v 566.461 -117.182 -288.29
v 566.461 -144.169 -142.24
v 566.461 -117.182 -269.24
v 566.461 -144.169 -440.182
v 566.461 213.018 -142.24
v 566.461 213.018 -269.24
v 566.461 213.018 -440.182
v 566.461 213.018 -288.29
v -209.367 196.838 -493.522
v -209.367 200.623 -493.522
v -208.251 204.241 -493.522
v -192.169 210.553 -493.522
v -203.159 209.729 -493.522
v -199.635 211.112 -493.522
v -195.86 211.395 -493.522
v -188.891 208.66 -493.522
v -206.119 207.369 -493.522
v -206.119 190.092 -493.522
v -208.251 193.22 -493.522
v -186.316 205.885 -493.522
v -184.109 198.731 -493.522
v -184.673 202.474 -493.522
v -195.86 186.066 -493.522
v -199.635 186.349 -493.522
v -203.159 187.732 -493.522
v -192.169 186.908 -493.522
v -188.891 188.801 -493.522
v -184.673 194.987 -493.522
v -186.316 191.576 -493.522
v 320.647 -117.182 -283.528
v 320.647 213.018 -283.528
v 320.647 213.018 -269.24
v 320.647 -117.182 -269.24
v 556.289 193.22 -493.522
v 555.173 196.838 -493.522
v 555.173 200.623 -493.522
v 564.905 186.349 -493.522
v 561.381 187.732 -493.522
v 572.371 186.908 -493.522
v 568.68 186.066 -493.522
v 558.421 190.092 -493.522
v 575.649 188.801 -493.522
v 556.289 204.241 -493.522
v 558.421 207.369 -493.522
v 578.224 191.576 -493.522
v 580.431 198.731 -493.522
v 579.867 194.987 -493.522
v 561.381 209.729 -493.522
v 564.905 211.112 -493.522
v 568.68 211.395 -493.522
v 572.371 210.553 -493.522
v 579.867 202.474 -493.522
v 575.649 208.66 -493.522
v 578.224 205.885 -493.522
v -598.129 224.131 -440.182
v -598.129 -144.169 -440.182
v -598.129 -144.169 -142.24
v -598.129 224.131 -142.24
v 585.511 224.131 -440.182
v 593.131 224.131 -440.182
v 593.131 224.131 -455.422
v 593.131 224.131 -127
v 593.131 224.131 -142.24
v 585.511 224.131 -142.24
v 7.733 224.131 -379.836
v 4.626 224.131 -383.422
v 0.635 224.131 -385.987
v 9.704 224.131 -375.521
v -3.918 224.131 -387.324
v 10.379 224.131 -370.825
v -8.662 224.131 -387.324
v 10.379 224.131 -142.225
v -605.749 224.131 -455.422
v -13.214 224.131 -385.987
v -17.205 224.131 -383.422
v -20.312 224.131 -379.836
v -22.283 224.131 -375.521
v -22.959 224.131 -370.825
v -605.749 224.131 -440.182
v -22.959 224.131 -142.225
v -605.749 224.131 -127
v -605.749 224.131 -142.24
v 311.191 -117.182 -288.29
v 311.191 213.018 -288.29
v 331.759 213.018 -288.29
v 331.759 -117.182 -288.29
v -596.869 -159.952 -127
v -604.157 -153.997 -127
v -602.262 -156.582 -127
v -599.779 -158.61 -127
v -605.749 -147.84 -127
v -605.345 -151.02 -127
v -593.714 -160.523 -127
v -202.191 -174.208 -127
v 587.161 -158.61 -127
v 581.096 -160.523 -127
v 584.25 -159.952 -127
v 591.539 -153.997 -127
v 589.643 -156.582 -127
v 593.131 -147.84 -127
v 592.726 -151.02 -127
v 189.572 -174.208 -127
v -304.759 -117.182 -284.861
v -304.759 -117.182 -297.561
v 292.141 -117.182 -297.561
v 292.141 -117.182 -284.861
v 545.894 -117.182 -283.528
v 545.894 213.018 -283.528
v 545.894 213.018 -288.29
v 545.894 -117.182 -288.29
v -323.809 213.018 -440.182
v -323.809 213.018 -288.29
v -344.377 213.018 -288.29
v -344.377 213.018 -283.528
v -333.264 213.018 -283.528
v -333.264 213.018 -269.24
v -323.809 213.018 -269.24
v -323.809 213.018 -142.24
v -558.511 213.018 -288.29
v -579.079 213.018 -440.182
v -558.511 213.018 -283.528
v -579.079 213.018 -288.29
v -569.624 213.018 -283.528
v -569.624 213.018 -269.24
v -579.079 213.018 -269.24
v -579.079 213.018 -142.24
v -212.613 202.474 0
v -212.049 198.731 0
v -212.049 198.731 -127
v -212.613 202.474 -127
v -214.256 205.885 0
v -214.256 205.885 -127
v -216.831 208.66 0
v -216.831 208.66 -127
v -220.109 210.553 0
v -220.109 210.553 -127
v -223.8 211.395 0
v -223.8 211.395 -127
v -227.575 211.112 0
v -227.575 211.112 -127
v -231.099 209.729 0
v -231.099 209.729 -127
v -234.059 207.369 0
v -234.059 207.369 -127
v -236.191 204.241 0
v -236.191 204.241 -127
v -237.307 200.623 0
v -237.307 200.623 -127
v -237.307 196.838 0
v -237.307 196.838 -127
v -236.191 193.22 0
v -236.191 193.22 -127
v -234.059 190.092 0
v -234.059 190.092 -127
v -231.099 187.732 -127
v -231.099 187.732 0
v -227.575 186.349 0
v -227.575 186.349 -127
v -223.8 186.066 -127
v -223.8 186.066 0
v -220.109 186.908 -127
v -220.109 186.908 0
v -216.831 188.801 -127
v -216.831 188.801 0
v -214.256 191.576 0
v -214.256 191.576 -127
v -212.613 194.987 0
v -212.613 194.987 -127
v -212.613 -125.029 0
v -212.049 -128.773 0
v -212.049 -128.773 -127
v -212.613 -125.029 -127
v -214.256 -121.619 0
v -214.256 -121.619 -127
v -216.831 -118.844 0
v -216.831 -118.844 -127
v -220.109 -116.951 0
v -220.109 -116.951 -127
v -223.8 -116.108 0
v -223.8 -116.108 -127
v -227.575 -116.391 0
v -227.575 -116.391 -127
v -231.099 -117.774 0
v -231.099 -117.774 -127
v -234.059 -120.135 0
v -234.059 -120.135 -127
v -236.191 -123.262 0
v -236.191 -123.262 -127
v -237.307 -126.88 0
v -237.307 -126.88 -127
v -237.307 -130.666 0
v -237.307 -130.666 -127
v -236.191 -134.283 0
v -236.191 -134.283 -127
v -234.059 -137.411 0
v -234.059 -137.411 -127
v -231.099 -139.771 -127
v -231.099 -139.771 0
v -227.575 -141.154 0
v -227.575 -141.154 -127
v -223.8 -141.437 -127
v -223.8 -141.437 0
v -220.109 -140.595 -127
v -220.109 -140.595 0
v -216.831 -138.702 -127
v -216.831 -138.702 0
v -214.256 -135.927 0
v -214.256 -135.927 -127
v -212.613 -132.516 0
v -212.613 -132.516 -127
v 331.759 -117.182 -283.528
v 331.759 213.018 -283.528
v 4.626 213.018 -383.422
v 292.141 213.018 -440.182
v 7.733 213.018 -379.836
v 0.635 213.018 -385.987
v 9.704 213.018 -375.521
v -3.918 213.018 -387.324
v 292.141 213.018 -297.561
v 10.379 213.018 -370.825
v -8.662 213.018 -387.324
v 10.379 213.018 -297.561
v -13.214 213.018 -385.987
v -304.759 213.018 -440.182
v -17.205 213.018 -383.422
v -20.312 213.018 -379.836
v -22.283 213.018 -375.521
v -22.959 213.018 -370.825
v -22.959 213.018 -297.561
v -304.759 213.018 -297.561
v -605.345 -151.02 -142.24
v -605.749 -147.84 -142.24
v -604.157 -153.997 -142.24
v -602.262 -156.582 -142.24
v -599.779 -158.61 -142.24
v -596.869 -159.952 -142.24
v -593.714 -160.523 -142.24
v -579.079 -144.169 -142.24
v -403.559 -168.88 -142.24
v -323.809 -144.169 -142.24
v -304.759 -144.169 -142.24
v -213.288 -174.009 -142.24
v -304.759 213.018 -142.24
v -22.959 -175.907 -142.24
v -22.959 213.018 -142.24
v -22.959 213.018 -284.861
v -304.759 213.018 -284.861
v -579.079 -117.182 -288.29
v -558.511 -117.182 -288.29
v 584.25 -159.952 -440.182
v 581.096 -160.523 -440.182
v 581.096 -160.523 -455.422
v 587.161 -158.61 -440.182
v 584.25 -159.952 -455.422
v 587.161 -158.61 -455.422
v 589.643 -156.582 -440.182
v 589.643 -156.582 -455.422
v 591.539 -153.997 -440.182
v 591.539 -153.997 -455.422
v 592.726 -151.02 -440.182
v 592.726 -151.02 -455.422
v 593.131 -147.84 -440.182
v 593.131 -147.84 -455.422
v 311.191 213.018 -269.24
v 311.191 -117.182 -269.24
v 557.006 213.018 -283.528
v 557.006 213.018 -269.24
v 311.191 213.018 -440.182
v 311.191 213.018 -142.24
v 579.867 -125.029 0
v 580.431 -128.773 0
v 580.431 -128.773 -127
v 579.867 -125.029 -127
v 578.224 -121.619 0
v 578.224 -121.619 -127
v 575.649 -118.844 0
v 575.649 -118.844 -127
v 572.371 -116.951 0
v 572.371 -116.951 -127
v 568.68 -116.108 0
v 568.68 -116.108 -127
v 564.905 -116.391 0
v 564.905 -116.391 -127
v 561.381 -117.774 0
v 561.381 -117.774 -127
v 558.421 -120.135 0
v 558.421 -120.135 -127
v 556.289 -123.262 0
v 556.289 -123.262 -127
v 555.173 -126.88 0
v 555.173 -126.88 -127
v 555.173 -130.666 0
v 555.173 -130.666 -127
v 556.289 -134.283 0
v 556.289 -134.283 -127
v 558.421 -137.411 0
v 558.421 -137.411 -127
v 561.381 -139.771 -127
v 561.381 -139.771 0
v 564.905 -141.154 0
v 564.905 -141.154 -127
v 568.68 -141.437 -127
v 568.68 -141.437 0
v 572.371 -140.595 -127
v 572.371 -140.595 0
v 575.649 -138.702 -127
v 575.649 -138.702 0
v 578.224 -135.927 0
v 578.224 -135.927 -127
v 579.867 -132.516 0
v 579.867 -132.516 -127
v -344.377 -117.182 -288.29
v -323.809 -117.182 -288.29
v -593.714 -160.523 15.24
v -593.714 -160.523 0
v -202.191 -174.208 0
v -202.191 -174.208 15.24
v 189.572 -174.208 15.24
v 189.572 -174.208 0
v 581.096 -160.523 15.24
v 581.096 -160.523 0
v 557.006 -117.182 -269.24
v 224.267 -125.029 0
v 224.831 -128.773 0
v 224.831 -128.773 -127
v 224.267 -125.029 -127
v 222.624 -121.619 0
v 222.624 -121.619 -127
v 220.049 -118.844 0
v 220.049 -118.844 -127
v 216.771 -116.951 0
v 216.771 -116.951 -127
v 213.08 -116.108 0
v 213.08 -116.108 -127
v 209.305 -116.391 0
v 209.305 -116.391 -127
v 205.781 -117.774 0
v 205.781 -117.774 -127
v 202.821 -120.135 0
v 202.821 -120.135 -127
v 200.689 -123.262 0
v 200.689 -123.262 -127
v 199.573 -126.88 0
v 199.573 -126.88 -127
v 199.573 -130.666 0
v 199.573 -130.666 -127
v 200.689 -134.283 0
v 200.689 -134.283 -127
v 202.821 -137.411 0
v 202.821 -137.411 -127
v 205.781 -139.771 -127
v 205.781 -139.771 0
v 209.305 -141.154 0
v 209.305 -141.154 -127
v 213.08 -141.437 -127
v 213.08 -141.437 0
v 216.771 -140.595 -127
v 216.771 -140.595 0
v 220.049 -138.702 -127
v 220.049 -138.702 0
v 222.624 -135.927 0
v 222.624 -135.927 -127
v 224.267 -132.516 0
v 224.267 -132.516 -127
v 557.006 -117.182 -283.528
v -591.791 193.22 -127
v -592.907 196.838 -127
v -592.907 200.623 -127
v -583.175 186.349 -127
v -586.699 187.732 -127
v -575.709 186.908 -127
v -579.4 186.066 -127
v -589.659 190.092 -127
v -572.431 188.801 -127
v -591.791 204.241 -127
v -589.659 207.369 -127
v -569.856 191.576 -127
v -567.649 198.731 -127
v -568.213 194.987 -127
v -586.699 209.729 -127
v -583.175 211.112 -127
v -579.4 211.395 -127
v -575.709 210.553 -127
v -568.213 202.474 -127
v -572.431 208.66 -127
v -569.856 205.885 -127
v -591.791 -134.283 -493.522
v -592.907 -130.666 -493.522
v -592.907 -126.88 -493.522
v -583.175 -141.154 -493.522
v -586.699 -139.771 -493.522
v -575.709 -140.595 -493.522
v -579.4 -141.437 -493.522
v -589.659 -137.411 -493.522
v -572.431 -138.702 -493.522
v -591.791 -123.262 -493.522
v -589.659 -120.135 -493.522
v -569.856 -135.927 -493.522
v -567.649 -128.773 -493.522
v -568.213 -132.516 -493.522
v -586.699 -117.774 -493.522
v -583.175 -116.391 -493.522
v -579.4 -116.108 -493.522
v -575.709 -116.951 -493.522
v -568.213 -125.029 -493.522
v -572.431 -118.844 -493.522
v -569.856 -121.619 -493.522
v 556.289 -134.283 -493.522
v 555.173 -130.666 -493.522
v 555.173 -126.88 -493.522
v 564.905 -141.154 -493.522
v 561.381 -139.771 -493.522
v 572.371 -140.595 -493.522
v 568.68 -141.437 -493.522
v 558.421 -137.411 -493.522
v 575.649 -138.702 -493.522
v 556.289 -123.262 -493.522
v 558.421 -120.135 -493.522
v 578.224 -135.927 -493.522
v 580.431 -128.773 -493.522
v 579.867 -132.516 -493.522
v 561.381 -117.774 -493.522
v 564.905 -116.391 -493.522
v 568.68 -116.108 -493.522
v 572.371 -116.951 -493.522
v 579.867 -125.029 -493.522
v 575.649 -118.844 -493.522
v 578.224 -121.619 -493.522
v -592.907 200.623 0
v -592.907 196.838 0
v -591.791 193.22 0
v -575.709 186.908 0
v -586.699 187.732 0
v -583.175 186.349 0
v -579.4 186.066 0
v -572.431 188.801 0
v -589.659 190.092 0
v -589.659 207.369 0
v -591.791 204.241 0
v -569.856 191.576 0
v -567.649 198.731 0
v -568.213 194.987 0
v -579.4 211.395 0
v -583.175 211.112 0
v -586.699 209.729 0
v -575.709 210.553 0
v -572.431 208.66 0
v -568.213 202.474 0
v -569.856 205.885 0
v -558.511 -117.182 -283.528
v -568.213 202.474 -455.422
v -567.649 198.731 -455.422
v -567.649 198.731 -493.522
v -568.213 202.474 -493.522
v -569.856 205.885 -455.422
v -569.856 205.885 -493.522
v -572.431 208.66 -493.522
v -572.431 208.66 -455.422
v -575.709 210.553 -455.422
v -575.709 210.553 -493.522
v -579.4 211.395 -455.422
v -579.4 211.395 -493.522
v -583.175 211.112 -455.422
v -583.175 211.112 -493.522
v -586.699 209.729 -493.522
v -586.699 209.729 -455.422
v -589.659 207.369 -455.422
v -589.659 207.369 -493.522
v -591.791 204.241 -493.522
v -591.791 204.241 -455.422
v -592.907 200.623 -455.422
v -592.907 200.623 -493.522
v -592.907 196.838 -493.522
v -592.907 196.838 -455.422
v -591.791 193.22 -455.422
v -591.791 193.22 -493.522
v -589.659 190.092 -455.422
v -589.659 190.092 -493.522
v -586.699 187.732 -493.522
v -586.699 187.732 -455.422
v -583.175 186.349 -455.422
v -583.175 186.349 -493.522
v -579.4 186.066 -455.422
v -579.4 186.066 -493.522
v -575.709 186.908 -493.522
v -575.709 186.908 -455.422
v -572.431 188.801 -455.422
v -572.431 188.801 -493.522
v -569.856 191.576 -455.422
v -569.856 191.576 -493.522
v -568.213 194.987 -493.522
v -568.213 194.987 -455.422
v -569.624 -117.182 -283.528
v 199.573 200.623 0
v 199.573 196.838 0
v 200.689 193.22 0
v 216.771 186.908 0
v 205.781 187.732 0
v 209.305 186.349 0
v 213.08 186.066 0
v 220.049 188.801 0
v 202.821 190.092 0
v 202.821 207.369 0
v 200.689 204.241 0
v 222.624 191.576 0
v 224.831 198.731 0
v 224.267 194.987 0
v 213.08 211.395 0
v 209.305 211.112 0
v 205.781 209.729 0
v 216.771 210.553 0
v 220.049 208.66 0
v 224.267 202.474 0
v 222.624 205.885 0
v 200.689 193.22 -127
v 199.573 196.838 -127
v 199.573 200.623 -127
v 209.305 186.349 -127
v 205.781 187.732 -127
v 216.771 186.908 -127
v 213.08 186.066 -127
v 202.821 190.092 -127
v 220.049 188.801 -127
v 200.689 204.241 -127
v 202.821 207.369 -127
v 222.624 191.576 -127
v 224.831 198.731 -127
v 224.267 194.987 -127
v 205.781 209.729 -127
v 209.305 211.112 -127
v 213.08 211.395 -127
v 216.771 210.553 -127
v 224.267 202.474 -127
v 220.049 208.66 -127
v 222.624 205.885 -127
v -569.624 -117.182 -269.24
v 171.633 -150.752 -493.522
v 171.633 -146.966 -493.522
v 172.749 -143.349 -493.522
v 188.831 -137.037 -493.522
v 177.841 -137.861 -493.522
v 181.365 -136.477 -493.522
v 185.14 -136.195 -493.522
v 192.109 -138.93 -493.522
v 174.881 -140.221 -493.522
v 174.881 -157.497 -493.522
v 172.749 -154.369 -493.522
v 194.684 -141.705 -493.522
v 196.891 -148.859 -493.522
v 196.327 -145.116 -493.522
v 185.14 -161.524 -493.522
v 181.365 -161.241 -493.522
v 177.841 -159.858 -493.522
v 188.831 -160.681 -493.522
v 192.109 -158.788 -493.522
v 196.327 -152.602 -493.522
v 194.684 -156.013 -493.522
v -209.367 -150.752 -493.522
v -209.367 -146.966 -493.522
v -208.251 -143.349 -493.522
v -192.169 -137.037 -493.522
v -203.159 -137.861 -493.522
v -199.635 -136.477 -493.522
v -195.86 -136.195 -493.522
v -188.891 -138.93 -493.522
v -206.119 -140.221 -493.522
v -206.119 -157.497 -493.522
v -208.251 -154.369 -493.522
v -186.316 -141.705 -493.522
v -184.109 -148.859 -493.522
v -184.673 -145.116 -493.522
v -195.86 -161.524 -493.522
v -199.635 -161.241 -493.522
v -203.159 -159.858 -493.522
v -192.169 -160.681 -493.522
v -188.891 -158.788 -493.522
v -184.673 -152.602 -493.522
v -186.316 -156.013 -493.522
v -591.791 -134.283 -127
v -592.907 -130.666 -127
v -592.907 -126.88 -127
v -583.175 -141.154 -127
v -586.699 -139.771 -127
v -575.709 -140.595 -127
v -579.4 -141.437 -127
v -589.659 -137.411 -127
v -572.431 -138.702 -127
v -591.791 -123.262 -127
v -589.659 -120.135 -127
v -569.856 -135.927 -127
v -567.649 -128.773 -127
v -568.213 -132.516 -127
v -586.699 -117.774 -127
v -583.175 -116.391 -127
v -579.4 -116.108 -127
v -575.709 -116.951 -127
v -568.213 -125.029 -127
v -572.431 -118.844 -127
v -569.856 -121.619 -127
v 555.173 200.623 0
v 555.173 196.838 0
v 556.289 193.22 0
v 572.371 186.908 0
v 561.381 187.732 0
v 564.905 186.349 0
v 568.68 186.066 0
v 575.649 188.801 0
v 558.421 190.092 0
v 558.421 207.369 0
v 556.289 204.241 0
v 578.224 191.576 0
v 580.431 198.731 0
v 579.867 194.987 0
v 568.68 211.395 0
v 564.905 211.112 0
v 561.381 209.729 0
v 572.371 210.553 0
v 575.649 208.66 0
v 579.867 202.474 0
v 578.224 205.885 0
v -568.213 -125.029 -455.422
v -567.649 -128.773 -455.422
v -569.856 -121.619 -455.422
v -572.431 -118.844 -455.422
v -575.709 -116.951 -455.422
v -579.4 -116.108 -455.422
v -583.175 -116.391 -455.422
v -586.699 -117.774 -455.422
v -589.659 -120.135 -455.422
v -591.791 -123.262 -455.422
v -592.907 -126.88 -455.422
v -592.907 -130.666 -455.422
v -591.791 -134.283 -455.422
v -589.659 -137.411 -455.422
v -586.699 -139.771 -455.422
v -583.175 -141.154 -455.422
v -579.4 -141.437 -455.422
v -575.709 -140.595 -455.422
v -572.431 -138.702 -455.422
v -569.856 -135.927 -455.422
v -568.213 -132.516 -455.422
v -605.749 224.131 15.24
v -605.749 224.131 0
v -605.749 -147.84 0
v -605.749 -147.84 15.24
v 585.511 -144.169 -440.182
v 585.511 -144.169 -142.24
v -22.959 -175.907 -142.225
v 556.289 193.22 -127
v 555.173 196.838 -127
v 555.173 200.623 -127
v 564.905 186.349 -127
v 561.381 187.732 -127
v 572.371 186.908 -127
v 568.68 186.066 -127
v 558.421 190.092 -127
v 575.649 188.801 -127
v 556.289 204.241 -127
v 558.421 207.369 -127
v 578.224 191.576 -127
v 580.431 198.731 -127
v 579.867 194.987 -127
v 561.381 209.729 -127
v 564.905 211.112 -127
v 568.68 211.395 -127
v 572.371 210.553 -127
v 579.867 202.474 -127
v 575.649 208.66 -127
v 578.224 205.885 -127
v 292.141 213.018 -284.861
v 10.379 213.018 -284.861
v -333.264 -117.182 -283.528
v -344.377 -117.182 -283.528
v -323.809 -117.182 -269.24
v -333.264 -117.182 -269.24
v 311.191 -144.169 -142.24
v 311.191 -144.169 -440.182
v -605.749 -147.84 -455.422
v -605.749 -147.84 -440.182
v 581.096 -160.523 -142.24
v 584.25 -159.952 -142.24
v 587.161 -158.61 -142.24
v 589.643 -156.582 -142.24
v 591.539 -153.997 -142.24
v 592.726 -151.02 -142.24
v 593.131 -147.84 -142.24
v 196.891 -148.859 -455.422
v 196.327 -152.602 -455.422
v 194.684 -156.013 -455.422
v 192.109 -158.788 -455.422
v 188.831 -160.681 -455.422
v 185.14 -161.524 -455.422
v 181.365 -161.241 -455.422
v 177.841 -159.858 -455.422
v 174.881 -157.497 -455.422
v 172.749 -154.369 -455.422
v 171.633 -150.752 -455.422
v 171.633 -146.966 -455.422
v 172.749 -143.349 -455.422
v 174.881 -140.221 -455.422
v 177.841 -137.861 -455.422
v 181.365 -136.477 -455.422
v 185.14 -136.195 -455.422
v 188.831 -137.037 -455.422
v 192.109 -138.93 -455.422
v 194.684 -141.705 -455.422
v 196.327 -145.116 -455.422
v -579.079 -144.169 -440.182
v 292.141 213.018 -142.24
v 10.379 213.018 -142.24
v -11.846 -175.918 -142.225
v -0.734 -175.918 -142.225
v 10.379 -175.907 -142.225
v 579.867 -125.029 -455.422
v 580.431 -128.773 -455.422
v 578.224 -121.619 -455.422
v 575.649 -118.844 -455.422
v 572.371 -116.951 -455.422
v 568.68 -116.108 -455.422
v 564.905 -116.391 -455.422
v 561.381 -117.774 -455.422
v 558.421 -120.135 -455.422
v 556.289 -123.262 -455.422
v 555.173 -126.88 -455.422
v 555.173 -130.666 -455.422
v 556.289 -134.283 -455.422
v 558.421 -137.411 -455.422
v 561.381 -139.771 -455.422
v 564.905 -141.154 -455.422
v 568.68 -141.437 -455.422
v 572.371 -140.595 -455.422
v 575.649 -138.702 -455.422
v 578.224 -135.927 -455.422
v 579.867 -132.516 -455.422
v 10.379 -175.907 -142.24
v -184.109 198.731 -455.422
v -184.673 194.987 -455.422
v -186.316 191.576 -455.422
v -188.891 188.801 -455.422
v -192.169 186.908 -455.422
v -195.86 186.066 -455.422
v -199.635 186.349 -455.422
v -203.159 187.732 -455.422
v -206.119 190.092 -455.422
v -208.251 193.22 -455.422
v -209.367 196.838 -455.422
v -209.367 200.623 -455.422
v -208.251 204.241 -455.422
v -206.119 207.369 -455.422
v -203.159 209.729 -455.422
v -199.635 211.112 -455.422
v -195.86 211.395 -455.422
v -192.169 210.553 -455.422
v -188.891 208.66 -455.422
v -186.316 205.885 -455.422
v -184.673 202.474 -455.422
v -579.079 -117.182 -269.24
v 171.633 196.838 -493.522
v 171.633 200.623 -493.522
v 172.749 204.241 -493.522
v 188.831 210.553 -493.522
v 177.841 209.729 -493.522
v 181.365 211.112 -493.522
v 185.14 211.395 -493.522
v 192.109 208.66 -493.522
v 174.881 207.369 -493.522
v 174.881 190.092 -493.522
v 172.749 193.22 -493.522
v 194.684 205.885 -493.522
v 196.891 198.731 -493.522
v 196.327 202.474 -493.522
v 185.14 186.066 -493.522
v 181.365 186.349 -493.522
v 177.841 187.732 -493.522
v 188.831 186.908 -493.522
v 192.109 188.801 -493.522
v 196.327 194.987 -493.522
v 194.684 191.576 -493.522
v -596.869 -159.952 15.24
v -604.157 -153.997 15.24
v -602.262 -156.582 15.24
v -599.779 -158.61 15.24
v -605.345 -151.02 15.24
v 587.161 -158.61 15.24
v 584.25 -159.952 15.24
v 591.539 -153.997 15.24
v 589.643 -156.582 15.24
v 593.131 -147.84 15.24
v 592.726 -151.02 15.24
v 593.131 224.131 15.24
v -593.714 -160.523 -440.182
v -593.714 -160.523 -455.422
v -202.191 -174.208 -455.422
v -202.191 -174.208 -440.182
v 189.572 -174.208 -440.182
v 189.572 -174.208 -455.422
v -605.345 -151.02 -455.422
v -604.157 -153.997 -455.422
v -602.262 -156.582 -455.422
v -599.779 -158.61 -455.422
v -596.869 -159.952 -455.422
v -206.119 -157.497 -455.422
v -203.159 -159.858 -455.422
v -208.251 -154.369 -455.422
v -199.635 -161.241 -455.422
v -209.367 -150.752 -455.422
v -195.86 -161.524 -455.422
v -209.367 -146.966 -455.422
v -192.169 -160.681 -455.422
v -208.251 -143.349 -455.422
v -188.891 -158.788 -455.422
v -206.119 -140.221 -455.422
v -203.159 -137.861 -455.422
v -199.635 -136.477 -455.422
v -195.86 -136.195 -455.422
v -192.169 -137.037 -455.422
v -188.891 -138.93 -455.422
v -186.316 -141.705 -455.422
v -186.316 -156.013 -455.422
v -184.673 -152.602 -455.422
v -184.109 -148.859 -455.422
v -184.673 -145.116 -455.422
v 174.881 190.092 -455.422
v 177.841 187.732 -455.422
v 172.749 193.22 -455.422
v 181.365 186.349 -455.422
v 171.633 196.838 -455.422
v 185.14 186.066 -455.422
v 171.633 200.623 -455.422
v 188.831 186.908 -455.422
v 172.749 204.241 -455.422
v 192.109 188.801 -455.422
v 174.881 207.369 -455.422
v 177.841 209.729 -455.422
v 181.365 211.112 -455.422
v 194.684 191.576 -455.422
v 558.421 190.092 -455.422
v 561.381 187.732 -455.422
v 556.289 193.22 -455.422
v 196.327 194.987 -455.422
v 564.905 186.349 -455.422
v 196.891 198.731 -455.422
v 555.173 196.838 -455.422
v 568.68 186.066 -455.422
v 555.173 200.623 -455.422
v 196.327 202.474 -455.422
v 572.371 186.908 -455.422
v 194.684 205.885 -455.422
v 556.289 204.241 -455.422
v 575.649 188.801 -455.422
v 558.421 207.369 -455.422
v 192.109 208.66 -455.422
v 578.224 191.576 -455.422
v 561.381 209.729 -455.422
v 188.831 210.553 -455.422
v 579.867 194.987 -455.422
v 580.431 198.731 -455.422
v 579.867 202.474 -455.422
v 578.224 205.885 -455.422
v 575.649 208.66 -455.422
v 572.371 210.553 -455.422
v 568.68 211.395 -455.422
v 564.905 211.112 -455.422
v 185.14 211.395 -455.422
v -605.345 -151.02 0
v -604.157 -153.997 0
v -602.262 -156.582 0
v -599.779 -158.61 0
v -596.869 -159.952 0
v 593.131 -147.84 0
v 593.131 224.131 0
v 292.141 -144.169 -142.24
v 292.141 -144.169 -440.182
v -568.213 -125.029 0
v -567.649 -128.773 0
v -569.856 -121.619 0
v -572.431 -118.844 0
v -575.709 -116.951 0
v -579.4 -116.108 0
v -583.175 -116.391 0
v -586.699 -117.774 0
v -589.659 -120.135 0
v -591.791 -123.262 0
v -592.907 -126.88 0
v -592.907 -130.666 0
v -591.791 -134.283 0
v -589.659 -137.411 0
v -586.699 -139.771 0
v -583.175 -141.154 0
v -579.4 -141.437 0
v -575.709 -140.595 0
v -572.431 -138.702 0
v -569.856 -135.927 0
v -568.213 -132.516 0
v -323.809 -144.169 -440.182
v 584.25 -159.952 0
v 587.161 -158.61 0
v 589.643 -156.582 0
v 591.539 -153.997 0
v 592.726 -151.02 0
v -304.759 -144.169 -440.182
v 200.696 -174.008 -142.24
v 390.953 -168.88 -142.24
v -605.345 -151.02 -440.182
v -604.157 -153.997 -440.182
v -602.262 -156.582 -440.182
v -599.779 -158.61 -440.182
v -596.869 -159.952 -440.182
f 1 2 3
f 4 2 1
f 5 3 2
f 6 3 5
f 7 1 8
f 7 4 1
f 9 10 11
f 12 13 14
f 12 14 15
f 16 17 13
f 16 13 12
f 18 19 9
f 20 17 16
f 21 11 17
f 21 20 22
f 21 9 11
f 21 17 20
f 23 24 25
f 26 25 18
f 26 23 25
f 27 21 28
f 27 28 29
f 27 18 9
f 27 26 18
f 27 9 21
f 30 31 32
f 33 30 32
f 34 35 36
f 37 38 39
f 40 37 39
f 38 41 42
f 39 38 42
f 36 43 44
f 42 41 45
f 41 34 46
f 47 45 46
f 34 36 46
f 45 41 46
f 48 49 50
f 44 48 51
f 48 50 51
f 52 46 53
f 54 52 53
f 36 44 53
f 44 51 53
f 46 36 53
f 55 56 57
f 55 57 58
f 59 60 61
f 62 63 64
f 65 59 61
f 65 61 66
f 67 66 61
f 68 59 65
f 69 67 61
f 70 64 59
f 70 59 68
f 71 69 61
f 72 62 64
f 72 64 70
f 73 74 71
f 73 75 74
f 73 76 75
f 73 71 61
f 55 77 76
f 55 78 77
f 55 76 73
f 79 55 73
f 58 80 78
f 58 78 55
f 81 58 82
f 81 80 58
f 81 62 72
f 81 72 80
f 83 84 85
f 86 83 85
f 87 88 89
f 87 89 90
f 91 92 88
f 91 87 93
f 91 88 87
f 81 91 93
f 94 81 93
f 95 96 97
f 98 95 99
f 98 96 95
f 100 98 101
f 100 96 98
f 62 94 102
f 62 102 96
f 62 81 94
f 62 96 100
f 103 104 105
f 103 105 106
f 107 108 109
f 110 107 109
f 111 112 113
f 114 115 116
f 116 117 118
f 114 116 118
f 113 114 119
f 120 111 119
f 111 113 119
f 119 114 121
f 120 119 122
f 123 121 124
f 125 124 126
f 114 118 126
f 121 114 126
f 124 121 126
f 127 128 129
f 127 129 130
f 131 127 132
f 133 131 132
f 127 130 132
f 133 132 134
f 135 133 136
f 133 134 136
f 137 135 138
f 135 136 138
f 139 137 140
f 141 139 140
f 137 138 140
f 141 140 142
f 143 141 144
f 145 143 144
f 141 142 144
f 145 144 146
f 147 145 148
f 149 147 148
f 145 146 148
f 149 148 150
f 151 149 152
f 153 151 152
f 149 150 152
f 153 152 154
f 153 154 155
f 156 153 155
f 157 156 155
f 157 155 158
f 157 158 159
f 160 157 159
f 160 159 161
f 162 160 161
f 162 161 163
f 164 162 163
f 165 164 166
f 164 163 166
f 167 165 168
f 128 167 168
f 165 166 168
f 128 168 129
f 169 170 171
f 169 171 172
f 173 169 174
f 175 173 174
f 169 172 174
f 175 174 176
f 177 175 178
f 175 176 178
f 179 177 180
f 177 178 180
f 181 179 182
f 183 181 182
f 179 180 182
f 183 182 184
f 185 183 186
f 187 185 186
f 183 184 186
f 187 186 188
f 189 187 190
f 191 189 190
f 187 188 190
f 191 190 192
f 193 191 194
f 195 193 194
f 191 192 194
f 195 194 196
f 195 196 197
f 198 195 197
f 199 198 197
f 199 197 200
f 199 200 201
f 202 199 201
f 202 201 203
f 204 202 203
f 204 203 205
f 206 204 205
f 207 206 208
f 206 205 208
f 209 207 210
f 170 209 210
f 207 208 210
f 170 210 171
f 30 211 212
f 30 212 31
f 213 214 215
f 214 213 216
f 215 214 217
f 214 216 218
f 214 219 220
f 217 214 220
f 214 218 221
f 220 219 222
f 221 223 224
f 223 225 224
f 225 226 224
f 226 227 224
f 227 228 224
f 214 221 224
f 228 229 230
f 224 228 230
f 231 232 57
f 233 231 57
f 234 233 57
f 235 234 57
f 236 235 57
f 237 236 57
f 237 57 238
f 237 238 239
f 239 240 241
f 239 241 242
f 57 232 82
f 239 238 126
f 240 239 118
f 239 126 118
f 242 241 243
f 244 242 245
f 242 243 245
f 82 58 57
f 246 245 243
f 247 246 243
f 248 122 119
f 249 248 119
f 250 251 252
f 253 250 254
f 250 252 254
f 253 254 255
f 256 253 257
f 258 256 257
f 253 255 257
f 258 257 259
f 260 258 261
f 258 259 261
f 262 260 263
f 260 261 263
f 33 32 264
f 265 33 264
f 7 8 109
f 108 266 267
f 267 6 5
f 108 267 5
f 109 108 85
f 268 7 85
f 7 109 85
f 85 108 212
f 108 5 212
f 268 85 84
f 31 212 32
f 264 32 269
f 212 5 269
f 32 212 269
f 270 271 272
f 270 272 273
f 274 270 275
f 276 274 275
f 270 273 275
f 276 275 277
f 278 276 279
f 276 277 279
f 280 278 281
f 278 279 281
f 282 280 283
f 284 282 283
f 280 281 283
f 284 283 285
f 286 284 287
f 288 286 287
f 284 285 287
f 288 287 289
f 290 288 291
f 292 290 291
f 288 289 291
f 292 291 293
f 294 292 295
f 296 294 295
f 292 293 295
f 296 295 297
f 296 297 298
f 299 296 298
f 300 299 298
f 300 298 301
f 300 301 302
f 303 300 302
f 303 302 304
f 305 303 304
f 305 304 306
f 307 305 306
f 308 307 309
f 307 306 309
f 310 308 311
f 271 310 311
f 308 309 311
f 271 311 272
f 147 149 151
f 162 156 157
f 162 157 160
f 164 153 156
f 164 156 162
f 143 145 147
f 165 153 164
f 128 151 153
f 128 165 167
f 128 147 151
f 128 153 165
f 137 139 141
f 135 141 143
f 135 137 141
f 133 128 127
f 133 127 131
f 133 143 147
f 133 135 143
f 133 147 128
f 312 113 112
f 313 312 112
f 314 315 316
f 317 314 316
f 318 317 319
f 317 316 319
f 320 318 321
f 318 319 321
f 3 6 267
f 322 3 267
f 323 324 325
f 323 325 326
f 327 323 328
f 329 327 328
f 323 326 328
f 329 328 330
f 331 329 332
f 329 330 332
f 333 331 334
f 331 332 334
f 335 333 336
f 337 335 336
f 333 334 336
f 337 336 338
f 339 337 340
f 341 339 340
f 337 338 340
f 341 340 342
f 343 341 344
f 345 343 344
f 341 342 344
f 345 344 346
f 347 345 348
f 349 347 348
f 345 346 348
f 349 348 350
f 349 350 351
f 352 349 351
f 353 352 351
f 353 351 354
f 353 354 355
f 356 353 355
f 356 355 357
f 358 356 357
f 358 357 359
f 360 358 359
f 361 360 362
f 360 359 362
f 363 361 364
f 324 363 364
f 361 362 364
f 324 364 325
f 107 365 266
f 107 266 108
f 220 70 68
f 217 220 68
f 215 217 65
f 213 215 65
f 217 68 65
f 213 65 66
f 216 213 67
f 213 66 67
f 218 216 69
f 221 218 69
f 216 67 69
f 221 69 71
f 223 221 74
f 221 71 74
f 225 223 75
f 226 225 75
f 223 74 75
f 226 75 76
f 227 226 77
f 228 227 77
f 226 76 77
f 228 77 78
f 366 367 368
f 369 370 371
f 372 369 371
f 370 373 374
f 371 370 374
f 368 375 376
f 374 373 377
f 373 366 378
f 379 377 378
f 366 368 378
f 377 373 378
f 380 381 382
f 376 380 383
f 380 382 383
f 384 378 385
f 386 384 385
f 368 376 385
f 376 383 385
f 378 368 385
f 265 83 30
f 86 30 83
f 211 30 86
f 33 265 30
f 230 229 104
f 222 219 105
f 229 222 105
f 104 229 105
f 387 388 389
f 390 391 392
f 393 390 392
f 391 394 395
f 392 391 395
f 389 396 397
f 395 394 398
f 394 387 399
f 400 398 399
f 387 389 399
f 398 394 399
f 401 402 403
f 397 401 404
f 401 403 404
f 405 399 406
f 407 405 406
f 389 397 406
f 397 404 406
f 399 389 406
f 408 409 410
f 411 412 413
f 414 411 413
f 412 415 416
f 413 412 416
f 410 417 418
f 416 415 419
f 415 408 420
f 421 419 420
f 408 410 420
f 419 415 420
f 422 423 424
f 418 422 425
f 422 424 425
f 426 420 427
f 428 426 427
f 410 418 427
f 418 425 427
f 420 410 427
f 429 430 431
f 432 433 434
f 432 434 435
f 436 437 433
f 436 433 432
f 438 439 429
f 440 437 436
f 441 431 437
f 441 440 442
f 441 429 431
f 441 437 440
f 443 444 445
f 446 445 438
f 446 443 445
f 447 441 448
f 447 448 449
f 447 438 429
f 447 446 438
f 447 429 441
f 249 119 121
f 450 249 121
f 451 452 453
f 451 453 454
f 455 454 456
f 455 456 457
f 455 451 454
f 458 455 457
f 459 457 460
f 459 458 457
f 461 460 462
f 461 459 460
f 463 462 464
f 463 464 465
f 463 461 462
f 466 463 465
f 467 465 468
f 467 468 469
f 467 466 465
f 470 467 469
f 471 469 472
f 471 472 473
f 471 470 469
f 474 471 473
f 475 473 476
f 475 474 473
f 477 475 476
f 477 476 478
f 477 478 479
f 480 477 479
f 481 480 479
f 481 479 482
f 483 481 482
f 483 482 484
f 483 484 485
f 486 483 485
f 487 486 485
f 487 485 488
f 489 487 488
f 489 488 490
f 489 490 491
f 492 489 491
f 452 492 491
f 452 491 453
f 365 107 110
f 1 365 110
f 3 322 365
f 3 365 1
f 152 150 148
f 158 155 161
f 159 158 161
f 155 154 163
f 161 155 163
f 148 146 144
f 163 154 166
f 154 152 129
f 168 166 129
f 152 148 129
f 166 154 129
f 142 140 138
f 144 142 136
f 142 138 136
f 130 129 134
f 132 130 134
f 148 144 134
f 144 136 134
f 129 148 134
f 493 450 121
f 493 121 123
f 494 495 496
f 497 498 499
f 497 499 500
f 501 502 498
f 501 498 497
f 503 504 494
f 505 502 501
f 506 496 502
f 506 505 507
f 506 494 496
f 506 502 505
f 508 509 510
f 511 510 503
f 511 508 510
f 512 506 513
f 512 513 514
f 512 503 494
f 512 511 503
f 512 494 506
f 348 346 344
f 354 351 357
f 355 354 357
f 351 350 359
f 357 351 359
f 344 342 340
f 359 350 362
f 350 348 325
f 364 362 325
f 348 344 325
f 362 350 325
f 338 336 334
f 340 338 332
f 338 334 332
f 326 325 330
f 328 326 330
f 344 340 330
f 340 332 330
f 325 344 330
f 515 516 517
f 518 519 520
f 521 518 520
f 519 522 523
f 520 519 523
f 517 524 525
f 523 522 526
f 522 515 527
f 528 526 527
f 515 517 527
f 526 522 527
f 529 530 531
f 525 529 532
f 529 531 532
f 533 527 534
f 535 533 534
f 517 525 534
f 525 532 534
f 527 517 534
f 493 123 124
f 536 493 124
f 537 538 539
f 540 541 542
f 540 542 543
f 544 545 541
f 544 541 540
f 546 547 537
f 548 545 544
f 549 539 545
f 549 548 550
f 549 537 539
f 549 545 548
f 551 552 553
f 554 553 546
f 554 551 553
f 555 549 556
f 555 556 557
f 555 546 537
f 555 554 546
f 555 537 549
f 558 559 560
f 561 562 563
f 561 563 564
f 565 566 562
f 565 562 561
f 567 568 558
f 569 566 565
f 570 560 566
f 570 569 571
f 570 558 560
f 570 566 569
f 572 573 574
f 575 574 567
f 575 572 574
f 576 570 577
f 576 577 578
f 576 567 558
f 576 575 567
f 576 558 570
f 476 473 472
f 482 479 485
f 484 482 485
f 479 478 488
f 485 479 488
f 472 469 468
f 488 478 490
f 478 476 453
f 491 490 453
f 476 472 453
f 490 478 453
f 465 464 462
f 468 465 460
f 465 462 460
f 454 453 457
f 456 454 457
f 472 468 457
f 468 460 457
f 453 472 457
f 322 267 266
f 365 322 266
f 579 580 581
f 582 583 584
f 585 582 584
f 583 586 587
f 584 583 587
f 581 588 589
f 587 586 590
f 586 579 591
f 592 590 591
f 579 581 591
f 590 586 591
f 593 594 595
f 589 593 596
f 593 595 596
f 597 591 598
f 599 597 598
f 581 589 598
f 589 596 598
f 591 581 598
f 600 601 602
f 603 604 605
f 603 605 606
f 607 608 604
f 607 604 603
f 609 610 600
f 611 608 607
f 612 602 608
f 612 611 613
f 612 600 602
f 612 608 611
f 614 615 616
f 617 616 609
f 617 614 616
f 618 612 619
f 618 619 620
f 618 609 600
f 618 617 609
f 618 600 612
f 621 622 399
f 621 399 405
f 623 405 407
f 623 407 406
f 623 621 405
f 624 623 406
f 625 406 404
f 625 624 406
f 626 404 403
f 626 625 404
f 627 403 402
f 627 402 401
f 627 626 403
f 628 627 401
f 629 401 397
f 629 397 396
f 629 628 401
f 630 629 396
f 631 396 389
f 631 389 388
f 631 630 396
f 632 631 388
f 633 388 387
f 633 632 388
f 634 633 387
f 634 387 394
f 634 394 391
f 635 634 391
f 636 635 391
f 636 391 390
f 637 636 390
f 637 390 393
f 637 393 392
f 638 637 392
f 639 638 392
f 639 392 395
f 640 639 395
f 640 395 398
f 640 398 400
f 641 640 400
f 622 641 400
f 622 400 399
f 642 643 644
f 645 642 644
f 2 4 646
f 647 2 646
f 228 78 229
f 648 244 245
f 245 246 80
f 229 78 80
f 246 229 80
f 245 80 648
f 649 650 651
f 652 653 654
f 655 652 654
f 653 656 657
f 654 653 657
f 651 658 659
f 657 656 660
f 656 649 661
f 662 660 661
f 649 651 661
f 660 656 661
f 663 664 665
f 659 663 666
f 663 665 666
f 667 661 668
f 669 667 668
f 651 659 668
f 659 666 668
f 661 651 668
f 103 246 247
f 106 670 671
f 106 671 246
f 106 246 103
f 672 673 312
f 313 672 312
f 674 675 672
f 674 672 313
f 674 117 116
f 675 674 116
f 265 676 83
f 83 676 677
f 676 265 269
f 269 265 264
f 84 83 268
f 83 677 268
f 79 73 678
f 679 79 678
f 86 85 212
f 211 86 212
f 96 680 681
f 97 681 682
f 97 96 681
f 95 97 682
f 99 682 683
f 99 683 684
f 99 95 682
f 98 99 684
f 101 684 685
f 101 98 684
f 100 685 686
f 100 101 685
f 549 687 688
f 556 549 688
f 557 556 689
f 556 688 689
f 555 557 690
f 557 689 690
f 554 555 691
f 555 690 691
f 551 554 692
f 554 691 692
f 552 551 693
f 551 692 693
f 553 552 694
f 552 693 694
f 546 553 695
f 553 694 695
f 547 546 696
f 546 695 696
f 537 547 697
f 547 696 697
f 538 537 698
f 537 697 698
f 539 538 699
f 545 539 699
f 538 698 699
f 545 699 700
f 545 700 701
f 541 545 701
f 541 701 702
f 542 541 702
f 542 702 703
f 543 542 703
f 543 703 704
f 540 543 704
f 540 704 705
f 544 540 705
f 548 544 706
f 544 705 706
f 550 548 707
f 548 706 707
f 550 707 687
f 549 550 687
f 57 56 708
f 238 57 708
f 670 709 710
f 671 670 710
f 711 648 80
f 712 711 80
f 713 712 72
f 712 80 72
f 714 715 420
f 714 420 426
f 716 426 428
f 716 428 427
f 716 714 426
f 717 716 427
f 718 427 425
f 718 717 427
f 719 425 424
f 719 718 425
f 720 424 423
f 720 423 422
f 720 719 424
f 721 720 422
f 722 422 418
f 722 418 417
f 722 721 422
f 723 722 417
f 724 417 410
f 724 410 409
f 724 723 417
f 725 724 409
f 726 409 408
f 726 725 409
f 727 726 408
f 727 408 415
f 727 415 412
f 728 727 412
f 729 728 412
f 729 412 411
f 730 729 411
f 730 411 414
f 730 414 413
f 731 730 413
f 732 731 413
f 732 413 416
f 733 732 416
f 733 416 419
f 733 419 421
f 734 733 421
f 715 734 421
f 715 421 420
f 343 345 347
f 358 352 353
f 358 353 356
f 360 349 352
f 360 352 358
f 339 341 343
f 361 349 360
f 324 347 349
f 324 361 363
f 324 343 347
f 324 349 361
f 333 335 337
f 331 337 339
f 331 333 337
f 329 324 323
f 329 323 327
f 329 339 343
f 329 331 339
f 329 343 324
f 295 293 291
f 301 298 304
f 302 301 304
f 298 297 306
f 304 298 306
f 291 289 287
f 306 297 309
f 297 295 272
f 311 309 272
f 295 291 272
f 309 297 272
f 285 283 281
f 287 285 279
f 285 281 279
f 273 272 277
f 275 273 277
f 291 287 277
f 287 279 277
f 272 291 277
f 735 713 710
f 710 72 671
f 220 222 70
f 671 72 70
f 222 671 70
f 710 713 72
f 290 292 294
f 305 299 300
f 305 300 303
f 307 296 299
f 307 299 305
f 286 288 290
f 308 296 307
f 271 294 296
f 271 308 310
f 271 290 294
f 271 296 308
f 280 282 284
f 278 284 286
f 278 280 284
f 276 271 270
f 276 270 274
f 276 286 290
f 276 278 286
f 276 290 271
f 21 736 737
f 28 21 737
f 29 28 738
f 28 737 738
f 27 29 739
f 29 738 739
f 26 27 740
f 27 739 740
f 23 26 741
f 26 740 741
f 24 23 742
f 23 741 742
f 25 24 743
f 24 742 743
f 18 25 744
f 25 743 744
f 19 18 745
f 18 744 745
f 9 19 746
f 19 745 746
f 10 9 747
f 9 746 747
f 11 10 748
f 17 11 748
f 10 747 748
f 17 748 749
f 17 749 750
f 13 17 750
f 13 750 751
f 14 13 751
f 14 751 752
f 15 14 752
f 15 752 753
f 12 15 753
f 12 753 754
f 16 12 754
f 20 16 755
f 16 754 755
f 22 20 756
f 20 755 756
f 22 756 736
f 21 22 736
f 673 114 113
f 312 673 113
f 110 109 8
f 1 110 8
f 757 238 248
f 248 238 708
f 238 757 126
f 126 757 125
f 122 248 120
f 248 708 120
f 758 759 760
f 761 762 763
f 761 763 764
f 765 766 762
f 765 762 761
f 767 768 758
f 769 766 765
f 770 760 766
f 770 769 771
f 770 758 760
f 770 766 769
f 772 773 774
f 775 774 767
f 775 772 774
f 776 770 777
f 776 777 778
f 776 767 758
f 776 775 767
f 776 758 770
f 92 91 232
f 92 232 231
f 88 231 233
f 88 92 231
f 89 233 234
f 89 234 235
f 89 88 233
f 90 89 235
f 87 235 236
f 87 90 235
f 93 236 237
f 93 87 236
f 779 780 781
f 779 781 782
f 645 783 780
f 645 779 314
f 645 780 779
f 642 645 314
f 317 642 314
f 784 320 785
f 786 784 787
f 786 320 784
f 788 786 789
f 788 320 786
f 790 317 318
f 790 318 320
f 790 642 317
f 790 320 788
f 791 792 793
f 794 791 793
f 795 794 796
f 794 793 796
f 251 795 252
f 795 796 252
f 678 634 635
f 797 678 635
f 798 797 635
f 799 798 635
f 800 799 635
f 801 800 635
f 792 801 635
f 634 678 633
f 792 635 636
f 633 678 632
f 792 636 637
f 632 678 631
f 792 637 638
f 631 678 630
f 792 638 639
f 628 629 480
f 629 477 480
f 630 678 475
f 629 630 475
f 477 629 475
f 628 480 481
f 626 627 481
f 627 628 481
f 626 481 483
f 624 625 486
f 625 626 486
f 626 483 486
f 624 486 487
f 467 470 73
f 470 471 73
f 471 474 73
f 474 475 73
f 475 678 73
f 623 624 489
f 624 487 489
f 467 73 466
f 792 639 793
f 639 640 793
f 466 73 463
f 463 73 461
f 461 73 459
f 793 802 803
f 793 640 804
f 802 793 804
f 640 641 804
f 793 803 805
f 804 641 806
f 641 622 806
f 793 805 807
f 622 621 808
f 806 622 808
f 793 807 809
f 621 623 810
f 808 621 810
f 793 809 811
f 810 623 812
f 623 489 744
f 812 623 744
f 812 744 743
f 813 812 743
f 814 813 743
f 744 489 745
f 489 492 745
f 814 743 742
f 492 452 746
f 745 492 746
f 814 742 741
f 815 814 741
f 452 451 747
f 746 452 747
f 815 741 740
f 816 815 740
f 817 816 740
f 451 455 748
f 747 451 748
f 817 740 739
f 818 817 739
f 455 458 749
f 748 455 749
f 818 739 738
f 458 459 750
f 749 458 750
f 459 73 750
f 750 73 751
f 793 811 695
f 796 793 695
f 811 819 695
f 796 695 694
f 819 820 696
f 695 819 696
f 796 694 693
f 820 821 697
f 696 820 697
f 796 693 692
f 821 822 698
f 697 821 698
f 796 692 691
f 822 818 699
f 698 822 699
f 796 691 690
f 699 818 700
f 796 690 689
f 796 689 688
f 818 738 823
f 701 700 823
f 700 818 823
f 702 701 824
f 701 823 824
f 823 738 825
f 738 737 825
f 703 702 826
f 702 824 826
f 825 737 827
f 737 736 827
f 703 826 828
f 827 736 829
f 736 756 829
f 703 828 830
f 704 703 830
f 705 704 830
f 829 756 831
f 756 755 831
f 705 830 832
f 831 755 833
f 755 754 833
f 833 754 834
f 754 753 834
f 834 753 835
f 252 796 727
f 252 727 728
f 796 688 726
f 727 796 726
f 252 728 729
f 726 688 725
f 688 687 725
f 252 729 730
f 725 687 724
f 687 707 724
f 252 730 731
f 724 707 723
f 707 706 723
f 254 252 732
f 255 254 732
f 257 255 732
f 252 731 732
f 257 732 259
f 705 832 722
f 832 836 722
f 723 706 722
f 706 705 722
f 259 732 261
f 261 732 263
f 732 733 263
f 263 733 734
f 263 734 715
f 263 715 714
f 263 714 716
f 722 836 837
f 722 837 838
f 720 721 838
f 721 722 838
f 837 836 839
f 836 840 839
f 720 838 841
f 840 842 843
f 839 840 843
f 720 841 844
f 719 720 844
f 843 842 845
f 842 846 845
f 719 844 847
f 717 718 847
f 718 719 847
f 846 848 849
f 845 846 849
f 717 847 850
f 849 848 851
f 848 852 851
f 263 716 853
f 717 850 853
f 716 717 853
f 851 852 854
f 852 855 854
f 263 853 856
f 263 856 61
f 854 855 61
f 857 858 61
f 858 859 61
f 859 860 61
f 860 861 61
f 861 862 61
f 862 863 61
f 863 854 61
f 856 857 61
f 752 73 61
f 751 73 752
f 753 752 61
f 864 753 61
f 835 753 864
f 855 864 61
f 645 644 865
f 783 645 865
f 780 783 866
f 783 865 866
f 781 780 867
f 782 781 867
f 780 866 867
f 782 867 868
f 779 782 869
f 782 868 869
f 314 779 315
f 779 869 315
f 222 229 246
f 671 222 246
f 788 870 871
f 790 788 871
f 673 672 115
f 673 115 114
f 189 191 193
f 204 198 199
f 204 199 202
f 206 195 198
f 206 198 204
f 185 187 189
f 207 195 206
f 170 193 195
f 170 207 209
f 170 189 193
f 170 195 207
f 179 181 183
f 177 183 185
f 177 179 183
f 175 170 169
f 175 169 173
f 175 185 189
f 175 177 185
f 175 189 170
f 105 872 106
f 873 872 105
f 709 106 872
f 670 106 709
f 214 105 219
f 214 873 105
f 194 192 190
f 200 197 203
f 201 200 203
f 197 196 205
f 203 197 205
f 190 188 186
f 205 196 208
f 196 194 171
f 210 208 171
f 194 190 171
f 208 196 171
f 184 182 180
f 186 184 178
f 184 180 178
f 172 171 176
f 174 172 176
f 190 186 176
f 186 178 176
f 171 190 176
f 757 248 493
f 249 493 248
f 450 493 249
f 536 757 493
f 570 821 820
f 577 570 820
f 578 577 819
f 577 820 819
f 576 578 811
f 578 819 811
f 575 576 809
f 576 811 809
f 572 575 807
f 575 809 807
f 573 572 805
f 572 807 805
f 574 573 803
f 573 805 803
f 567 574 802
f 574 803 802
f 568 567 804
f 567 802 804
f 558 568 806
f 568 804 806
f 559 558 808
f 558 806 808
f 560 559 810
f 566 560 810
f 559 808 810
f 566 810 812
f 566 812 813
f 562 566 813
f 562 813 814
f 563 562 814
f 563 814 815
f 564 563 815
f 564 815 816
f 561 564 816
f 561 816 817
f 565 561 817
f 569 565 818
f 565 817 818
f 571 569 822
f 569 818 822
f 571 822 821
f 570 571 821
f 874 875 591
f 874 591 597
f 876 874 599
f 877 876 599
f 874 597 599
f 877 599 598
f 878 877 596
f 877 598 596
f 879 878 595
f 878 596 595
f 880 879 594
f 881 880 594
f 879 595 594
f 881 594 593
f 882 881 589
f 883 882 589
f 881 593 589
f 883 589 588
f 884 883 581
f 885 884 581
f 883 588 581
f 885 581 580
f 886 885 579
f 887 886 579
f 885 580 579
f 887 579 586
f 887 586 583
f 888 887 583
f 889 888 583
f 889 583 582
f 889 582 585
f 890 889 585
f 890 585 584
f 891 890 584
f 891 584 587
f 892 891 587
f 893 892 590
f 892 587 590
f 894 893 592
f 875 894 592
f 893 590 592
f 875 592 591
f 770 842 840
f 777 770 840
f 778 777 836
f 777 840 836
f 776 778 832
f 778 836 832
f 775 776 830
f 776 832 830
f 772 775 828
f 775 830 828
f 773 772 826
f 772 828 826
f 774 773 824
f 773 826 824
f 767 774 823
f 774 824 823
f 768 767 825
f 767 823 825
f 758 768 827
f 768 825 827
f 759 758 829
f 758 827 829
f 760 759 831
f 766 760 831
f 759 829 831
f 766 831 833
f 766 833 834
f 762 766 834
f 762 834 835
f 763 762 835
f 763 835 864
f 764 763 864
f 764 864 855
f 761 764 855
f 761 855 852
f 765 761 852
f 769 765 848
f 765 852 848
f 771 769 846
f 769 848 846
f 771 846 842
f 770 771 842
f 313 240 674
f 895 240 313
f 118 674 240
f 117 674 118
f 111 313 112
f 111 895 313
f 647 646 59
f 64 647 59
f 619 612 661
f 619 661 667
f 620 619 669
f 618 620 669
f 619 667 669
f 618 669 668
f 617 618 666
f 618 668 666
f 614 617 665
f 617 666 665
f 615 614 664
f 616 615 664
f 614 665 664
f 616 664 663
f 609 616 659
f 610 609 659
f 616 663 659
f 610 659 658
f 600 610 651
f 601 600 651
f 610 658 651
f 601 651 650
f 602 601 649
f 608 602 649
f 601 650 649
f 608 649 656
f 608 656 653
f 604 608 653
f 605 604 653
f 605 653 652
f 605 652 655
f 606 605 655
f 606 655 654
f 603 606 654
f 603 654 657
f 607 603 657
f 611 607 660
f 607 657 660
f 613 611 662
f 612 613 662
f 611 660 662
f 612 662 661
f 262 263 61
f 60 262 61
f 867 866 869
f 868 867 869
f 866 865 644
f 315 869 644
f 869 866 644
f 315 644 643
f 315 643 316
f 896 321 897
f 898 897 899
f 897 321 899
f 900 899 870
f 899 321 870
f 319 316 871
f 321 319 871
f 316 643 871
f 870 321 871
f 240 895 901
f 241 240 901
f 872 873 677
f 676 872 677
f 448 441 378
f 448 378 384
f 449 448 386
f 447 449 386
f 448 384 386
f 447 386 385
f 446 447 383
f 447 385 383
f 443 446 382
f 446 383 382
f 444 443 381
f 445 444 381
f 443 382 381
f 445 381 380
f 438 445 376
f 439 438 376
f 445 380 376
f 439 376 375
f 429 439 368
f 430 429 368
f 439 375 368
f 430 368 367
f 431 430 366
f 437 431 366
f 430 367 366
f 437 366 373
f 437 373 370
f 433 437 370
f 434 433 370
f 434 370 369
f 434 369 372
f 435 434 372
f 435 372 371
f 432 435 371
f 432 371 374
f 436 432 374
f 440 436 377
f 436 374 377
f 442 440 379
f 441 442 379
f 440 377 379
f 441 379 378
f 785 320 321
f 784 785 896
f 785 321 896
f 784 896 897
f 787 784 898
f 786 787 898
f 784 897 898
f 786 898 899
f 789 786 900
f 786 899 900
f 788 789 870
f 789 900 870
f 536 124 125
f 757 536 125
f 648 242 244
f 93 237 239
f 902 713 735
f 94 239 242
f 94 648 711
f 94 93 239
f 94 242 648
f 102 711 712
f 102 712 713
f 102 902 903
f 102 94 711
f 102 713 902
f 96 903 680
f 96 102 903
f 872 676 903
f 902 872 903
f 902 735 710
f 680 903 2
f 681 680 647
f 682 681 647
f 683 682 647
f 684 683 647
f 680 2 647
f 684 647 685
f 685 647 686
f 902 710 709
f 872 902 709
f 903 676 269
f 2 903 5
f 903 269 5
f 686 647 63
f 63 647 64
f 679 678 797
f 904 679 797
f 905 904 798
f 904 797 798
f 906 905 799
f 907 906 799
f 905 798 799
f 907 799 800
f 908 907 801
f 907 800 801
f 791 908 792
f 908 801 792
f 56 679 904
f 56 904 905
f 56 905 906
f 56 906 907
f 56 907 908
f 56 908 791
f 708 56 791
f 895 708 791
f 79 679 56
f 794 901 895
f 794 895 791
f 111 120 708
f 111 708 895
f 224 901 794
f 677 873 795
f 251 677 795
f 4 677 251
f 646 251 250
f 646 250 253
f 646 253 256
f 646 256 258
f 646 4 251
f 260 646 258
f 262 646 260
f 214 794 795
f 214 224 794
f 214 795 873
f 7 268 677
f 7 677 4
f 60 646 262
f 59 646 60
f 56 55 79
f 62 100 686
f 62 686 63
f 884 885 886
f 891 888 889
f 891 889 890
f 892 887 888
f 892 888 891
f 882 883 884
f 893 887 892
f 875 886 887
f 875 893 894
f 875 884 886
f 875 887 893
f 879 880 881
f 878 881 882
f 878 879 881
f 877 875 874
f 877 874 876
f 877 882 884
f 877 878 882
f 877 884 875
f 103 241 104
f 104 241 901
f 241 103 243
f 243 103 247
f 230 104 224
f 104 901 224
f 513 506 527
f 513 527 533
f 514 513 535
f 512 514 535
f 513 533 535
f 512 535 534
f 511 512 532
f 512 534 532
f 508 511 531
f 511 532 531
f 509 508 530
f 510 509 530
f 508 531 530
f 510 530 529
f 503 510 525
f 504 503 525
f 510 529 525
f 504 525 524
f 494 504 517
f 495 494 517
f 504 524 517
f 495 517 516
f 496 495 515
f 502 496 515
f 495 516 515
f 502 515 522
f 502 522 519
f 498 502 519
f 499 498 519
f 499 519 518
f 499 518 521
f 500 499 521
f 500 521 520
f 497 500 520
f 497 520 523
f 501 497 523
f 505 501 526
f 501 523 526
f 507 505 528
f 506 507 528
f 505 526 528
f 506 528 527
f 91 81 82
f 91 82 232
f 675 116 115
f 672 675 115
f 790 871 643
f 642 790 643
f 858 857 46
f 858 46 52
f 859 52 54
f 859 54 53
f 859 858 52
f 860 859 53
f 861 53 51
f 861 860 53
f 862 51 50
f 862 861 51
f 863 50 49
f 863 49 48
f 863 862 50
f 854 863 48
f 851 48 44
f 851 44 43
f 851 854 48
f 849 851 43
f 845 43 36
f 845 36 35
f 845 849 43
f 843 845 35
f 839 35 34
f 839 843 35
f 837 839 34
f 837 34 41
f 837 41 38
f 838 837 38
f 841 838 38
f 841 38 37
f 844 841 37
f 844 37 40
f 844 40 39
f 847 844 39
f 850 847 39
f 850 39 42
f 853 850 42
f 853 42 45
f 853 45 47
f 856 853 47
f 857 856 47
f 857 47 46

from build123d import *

# Parameters (mm, degrees)
F1_DEPTH  = 15.24
F4_R      = 12.7
F5_DEPTH  = 127
F8_W      = 19.05
F8_H      = 368.3
F9_DEPTH  = 297.942
F11_DEPTH = 88.9
F12_R     = 12.7
F13_DEPTH = 38.1
F14_DEPTH = 127
F16_DEPTH = 11.1125
F17_DEPTH = 11.1125
F19_DEPTH = 400.051
F20_W     = 330.2
F20_H     = 12.7
F21_DEPTH = 596.9
F24_DEPTH = 330.2


with BuildPart() as f1:
    # F0 (on Top) → F1 (new body)
    with BuildSketch(Plane.XY):
        with BuildLine():
            Line((593.1309675598, 224.1305482292), (-605.7490324402, 224.1305482292))
            Line((-605.7490324402, 224.1305482292), (-605.7490324402, -147.8402112013))
            ThreePointArc((-605.7490324402, -147.8402112013), (-602.2615089914, -156.582080326), (-593.7143433388, -160.5227725123))
            ThreePointArc((-593.7143433388, -160.5227725123), (-6.3090324402, -175.9194517708), (581.0962784585, -160.5227725123))
            ThreePointArc((581.0962784585, -160.5227725123), (589.643444111, -156.582080326), (593.1309675598, -147.8402112013))
            Line((593.1309675598, -147.8402112013), (593.1309675598, 224.1305482292))
        make_face()
    extrude(amount=F1_DEPTH)


with BuildPart() as f3_1:
    # F3: instance of F1
    add(f1.part.mirror(Plane.XY.offset(-63.5)))


with BuildPart() as f5:
    # F4 (on face) → F5 (new body)
    with BuildSketch(Plane.XY.offset(-127)):
        with Locations((-580.3490324402, -128.7727725123)):
            Circle(F4_R)
    extrude(amount=F5_DEPTH)


with BuildPart() as f5b:
    # F4 (on face) → F5, piece 2 (new body)
    with BuildSketch(Plane.XY.offset(-127)):
        with Locations((-580.3490324402, 198.7305482292)):
            Circle(F4_R)
    extrude(amount=F5_DEPTH)


with BuildPart() as f5c:
    # F4 (on face) → F5, piece 3 (new body)
    with BuildSketch(Plane.XY.offset(-127)):
        with Locations((567.7309675598, 198.7305482292)):
            Circle(F4_R)
    extrude(amount=F5_DEPTH)


with BuildPart() as f5d:
    # F4 (on face) → F5, piece 4 (new body)
    with BuildSketch(Plane.XY.offset(-127)):
        with Locations((567.7309675598, -128.7727725123)):
            Circle(F4_R)
    extrude(amount=F5_DEPTH)


with BuildPart() as f7_1:
    # F7: instance of F3_1
    add(f3_1.part.mirror(Plane(origin=(-6.3090324402, 26.7720476181, -291.211), x_dir=(1, 0, 0), z_dir=(0, 0, -1))))

    # F10: F5d, F5c, F5b, F5 across plane
    add(f5d.part.mirror(Plane(origin=(-6.3090324402, 26.7720476181, -291.211), x_dir=(1, 0, 0), z_dir=(0, 0, -1))))
    add(f5c.part.mirror(Plane(origin=(-6.3090324402, 26.7720476181, -291.211), x_dir=(1, 0, 0), z_dir=(0, 0, -1))))
    add(f5b.part.mirror(Plane(origin=(-6.3090324402, 26.7720476181, -291.211), x_dir=(1, 0, 0), z_dir=(0, 0, -1))))
    add(f5.part.mirror(Plane(origin=(-6.3090324402, 26.7720476181, -291.211), x_dir=(1, 0, 0), z_dir=(0, 0, -1))))

    # F11 (cut): faces of the model
    f11_faces = [f7_1.faces().sort_by_distance(p)[0] for p in [
        (567.7309675598, -128.7727725123, -582.422),
        (567.7309675598, 198.7305482292, -582.422),
        (-580.3490324402, 198.7305482292, -582.422),
        (-580.3490324402, -128.7727725123, -582.422),
    ]]
    extrude(f11_faces, amount=-F11_DEPTH, mode=Mode.SUBTRACT)

    # F12 (on face) → F13 (join)
    with BuildSketch(Plane(origin=(0, 0, -455.422), x_dir=(1, 0, 0), z_dir=(0, 0, -1))):
        with Locations((184.1909675598, 148.8590687513)):
            Circle(F12_R)
        with Locations((-196.8090324402, 148.8590687513)):
            Circle(F12_R)
        with Locations((184.1909675598, -198.7305482292)):
            Circle(F12_R)
        with Locations((-196.8090324402, -198.7305482292)):
            Circle(F12_R)
    extrude(amount=F13_DEPTH)


with BuildPart() as f9:
    # F8 (on face) → F9 (new body)
    with BuildSketch(Plane.XY.offset(-440.182)):
        with Locations((-314.2840324402, 39.9805482292)):
            Rectangle(F8_W, F8_H)
    extrude(amount=F9_DEPTH)


with BuildPart() as f9b:
    # F8 (on face) → F9, piece 2 (new body)
    with BuildSketch(Plane.XY.offset(-440.182)):
        with Locations((-588.6040324402, 39.9805482292)):
            Rectangle(F8_W, F8_H)
    extrude(amount=F9_DEPTH)


with BuildPart() as f9c:
    # F8 (on face) → F9, piece 3 (new body)
    with BuildSketch(Plane.XY.offset(-440.182)):
        with Locations((301.6659675598, 39.9805482292)):
            Rectangle(F8_W, F8_H)
    extrude(amount=F9_DEPTH)


with BuildPart() as f9d:
    # F8 (on face) → F9, piece 4 (new body)
    with BuildSketch(Plane.XY.offset(-440.182)):
        with Locations((575.9859675598, 39.9805482292)):
            Rectangle(F8_W, F8_H)
    extrude(amount=F9_DEPTH)


with BuildPart() as f14:
    # F4 (on face) → F14 (new body)
    with BuildSketch(Plane.XY.offset(-127)):
        with Locations((-224.7490324402, -128.7727725123)):
            Circle(F4_R)
    extrude(amount=F14_DEPTH)


with BuildPart() as f14b:
    # F4 (on face) → F14, piece 2 (new body)
    with BuildSketch(Plane.XY.offset(-127)):
        with Locations((212.1309675598, -128.7727725123)):
            Circle(F4_R)
    extrude(amount=F14_DEPTH)


with BuildPart() as f14c:
    # F4 (on face) → F14, piece 3 (new body)
    with BuildSketch(Plane.XY.offset(-127)):
        with Locations((212.1309675598, 198.7305482292)):
            Circle(F4_R)
    extrude(amount=F14_DEPTH)


with BuildPart() as f14d:
    # F4 (on face) → F14, piece 4 (new body)
    with BuildSketch(Plane.XY.offset(-127)):
        with Locations((-224.7490324402, 198.7305482292)):
            Circle(F4_R)
    extrude(amount=F14_DEPTH)


with BuildPart() as f16_tool:
    # F15 (on face) → F16 (new body)
    with BuildSketch(Plane(origin=(0, 224.1305482292, 0), x_dir=(-1, 0, 0), z_dir=(0, 1, 0))):
        Polygon((-574.3984675598, -134.3025), (-574.3984675598, -142.24), (-566.4609675598, -142.24), (-566.4609675598, -440.182), (-574.3984675598, -440.182), (-574.3984675598, -448.1195), (587.0165340424, -448.1195), (587.0165340424, -134.3025), align=None)
    extrude(amount=-F16_DEPTH)


with BuildPart() as f3_1_1:
    add(f3_1.part)

    # F16: cut by f16_tool
    add(f16_tool.part, mode=Mode.SUBTRACT)



with BuildPart() as f7_1_1:
    add(f7_1.part)

    # F16: cut by f16_tool
    add(f16_tool.part, mode=Mode.SUBTRACT)


with BuildPart() as f9_1:
    add(f9.part)

    # F16: cut by f16_tool
    add(f16_tool.part, mode=Mode.SUBTRACT)


with BuildPart() as f9b_1:
    add(f9b.part)

    # F16: cut by f16_tool
    add(f16_tool.part, mode=Mode.SUBTRACT)


with BuildPart() as f9c_1:
    add(f9c.part)

    # F16: cut by f16_tool
    add(f16_tool.part, mode=Mode.SUBTRACT)


with BuildPart() as f3_1_2:
    add(f3_1_1.part)

    add(f7_1_1.part)  # F17 merges F7_1

    add(f9_1.part)  # F17 merges F9

    add(f9b_1.part)  # F17 merges F9b

    add(f9c_1.part)  # F17 merges F9c

    add(f9d.part)  # F17 merges F9d
    # F15 (on face) → F17 (join)
    with BuildSketch(Plane(origin=(0, 224.1305482292, 0), x_dir=(-1, 0, 0), z_dir=(0, 1, 0))):
        Polygon((-574.3984675598, -134.3025), (-574.3984675598, -142.24), (-566.4609675598, -142.24), (-566.4609675598, -440.182), (-574.3984675598, -440.182), (-574.3984675598, -448.1195), (587.0165340424, -448.1195), (587.0165340424, -134.3025), align=None)
    extrude(amount=-F17_DEPTH)

    # F18 (on face) → F19 (cut, through all)
    with BuildSketch(Plane(origin=(0, 224.1305482292, 0), x_dir=(-1, 0, 0), z_dir=(0, 1, 0))):
        with BuildLine():
            ThreePointArc((-10.3789698601, -370.8245055437), (6.2897801399, -387.4932555437), (22.9585301399, -370.8245055437))
            Line((22.9585301399, -370.8245055437), (22.9585301399, -142.2245055437))
            Line((22.9585301399, -142.2245055437), (-10.3789698601, -142.2245055437))
            Line((-10.3789698601, -142.2245055437), (-10.3789698601, -370.8245055437))
        make_face()
    extrude(amount=-F19_DEPTH, mode=Mode.SUBTRACT)

    # F20 (on face) → F21 (join)
    with BuildSketch(Plane(origin=(292.1409675598, 0, 0), x_dir=(0, -1, 0), z_dir=(-1, 0, 0))):
        with Locations((-47.9180482292, -291.211)):
            Rectangle(F20_W, F20_H)
    extrude(amount=F21_DEPTH)

    # F23 (on face) → F24 (join)
    with BuildSketch(Plane.XZ.offset(-213.0180482292)):
        Polygon((-323.8090324402, -288.29), (-323.8090324402, -269.24), (-333.2642428398, -269.24), (-333.2642428398, -283.5275), (-344.3767428398, -283.5275), (-344.3767428398, -288.29), align=None)
        Polygon((-569.6238220406, -269.24), (-579.0790324402, -269.24), (-579.0790324402, -288.29), (-558.5113220406, -288.29), (-558.5113220406, -283.5275), (-569.6238220406, -283.5275), align=None)
        Polygon((320.6468866959, -269.24), (311.1218866959, -269.24), (311.1218866959, -288.29), (331.7593866959, -288.29), (331.7593866959, -283.5275), (320.6468866959, -283.5275), align=None)
        Polygon((566.5314658967, -288.29), (566.5314658967, -269.24), (557.0064658967, -269.24), (557.0064658967, -283.5275), (545.8939658967, -283.5275), (545.8939658967, -288.29), align=None)
    extrude(amount=F24_DEPTH)


solid = Compound([f1.part, f5.part, f5b.part, f5c.part, f5d.part, f14.part, f14b.part, f14c.part, f14d.part, f3_1_2.part])
